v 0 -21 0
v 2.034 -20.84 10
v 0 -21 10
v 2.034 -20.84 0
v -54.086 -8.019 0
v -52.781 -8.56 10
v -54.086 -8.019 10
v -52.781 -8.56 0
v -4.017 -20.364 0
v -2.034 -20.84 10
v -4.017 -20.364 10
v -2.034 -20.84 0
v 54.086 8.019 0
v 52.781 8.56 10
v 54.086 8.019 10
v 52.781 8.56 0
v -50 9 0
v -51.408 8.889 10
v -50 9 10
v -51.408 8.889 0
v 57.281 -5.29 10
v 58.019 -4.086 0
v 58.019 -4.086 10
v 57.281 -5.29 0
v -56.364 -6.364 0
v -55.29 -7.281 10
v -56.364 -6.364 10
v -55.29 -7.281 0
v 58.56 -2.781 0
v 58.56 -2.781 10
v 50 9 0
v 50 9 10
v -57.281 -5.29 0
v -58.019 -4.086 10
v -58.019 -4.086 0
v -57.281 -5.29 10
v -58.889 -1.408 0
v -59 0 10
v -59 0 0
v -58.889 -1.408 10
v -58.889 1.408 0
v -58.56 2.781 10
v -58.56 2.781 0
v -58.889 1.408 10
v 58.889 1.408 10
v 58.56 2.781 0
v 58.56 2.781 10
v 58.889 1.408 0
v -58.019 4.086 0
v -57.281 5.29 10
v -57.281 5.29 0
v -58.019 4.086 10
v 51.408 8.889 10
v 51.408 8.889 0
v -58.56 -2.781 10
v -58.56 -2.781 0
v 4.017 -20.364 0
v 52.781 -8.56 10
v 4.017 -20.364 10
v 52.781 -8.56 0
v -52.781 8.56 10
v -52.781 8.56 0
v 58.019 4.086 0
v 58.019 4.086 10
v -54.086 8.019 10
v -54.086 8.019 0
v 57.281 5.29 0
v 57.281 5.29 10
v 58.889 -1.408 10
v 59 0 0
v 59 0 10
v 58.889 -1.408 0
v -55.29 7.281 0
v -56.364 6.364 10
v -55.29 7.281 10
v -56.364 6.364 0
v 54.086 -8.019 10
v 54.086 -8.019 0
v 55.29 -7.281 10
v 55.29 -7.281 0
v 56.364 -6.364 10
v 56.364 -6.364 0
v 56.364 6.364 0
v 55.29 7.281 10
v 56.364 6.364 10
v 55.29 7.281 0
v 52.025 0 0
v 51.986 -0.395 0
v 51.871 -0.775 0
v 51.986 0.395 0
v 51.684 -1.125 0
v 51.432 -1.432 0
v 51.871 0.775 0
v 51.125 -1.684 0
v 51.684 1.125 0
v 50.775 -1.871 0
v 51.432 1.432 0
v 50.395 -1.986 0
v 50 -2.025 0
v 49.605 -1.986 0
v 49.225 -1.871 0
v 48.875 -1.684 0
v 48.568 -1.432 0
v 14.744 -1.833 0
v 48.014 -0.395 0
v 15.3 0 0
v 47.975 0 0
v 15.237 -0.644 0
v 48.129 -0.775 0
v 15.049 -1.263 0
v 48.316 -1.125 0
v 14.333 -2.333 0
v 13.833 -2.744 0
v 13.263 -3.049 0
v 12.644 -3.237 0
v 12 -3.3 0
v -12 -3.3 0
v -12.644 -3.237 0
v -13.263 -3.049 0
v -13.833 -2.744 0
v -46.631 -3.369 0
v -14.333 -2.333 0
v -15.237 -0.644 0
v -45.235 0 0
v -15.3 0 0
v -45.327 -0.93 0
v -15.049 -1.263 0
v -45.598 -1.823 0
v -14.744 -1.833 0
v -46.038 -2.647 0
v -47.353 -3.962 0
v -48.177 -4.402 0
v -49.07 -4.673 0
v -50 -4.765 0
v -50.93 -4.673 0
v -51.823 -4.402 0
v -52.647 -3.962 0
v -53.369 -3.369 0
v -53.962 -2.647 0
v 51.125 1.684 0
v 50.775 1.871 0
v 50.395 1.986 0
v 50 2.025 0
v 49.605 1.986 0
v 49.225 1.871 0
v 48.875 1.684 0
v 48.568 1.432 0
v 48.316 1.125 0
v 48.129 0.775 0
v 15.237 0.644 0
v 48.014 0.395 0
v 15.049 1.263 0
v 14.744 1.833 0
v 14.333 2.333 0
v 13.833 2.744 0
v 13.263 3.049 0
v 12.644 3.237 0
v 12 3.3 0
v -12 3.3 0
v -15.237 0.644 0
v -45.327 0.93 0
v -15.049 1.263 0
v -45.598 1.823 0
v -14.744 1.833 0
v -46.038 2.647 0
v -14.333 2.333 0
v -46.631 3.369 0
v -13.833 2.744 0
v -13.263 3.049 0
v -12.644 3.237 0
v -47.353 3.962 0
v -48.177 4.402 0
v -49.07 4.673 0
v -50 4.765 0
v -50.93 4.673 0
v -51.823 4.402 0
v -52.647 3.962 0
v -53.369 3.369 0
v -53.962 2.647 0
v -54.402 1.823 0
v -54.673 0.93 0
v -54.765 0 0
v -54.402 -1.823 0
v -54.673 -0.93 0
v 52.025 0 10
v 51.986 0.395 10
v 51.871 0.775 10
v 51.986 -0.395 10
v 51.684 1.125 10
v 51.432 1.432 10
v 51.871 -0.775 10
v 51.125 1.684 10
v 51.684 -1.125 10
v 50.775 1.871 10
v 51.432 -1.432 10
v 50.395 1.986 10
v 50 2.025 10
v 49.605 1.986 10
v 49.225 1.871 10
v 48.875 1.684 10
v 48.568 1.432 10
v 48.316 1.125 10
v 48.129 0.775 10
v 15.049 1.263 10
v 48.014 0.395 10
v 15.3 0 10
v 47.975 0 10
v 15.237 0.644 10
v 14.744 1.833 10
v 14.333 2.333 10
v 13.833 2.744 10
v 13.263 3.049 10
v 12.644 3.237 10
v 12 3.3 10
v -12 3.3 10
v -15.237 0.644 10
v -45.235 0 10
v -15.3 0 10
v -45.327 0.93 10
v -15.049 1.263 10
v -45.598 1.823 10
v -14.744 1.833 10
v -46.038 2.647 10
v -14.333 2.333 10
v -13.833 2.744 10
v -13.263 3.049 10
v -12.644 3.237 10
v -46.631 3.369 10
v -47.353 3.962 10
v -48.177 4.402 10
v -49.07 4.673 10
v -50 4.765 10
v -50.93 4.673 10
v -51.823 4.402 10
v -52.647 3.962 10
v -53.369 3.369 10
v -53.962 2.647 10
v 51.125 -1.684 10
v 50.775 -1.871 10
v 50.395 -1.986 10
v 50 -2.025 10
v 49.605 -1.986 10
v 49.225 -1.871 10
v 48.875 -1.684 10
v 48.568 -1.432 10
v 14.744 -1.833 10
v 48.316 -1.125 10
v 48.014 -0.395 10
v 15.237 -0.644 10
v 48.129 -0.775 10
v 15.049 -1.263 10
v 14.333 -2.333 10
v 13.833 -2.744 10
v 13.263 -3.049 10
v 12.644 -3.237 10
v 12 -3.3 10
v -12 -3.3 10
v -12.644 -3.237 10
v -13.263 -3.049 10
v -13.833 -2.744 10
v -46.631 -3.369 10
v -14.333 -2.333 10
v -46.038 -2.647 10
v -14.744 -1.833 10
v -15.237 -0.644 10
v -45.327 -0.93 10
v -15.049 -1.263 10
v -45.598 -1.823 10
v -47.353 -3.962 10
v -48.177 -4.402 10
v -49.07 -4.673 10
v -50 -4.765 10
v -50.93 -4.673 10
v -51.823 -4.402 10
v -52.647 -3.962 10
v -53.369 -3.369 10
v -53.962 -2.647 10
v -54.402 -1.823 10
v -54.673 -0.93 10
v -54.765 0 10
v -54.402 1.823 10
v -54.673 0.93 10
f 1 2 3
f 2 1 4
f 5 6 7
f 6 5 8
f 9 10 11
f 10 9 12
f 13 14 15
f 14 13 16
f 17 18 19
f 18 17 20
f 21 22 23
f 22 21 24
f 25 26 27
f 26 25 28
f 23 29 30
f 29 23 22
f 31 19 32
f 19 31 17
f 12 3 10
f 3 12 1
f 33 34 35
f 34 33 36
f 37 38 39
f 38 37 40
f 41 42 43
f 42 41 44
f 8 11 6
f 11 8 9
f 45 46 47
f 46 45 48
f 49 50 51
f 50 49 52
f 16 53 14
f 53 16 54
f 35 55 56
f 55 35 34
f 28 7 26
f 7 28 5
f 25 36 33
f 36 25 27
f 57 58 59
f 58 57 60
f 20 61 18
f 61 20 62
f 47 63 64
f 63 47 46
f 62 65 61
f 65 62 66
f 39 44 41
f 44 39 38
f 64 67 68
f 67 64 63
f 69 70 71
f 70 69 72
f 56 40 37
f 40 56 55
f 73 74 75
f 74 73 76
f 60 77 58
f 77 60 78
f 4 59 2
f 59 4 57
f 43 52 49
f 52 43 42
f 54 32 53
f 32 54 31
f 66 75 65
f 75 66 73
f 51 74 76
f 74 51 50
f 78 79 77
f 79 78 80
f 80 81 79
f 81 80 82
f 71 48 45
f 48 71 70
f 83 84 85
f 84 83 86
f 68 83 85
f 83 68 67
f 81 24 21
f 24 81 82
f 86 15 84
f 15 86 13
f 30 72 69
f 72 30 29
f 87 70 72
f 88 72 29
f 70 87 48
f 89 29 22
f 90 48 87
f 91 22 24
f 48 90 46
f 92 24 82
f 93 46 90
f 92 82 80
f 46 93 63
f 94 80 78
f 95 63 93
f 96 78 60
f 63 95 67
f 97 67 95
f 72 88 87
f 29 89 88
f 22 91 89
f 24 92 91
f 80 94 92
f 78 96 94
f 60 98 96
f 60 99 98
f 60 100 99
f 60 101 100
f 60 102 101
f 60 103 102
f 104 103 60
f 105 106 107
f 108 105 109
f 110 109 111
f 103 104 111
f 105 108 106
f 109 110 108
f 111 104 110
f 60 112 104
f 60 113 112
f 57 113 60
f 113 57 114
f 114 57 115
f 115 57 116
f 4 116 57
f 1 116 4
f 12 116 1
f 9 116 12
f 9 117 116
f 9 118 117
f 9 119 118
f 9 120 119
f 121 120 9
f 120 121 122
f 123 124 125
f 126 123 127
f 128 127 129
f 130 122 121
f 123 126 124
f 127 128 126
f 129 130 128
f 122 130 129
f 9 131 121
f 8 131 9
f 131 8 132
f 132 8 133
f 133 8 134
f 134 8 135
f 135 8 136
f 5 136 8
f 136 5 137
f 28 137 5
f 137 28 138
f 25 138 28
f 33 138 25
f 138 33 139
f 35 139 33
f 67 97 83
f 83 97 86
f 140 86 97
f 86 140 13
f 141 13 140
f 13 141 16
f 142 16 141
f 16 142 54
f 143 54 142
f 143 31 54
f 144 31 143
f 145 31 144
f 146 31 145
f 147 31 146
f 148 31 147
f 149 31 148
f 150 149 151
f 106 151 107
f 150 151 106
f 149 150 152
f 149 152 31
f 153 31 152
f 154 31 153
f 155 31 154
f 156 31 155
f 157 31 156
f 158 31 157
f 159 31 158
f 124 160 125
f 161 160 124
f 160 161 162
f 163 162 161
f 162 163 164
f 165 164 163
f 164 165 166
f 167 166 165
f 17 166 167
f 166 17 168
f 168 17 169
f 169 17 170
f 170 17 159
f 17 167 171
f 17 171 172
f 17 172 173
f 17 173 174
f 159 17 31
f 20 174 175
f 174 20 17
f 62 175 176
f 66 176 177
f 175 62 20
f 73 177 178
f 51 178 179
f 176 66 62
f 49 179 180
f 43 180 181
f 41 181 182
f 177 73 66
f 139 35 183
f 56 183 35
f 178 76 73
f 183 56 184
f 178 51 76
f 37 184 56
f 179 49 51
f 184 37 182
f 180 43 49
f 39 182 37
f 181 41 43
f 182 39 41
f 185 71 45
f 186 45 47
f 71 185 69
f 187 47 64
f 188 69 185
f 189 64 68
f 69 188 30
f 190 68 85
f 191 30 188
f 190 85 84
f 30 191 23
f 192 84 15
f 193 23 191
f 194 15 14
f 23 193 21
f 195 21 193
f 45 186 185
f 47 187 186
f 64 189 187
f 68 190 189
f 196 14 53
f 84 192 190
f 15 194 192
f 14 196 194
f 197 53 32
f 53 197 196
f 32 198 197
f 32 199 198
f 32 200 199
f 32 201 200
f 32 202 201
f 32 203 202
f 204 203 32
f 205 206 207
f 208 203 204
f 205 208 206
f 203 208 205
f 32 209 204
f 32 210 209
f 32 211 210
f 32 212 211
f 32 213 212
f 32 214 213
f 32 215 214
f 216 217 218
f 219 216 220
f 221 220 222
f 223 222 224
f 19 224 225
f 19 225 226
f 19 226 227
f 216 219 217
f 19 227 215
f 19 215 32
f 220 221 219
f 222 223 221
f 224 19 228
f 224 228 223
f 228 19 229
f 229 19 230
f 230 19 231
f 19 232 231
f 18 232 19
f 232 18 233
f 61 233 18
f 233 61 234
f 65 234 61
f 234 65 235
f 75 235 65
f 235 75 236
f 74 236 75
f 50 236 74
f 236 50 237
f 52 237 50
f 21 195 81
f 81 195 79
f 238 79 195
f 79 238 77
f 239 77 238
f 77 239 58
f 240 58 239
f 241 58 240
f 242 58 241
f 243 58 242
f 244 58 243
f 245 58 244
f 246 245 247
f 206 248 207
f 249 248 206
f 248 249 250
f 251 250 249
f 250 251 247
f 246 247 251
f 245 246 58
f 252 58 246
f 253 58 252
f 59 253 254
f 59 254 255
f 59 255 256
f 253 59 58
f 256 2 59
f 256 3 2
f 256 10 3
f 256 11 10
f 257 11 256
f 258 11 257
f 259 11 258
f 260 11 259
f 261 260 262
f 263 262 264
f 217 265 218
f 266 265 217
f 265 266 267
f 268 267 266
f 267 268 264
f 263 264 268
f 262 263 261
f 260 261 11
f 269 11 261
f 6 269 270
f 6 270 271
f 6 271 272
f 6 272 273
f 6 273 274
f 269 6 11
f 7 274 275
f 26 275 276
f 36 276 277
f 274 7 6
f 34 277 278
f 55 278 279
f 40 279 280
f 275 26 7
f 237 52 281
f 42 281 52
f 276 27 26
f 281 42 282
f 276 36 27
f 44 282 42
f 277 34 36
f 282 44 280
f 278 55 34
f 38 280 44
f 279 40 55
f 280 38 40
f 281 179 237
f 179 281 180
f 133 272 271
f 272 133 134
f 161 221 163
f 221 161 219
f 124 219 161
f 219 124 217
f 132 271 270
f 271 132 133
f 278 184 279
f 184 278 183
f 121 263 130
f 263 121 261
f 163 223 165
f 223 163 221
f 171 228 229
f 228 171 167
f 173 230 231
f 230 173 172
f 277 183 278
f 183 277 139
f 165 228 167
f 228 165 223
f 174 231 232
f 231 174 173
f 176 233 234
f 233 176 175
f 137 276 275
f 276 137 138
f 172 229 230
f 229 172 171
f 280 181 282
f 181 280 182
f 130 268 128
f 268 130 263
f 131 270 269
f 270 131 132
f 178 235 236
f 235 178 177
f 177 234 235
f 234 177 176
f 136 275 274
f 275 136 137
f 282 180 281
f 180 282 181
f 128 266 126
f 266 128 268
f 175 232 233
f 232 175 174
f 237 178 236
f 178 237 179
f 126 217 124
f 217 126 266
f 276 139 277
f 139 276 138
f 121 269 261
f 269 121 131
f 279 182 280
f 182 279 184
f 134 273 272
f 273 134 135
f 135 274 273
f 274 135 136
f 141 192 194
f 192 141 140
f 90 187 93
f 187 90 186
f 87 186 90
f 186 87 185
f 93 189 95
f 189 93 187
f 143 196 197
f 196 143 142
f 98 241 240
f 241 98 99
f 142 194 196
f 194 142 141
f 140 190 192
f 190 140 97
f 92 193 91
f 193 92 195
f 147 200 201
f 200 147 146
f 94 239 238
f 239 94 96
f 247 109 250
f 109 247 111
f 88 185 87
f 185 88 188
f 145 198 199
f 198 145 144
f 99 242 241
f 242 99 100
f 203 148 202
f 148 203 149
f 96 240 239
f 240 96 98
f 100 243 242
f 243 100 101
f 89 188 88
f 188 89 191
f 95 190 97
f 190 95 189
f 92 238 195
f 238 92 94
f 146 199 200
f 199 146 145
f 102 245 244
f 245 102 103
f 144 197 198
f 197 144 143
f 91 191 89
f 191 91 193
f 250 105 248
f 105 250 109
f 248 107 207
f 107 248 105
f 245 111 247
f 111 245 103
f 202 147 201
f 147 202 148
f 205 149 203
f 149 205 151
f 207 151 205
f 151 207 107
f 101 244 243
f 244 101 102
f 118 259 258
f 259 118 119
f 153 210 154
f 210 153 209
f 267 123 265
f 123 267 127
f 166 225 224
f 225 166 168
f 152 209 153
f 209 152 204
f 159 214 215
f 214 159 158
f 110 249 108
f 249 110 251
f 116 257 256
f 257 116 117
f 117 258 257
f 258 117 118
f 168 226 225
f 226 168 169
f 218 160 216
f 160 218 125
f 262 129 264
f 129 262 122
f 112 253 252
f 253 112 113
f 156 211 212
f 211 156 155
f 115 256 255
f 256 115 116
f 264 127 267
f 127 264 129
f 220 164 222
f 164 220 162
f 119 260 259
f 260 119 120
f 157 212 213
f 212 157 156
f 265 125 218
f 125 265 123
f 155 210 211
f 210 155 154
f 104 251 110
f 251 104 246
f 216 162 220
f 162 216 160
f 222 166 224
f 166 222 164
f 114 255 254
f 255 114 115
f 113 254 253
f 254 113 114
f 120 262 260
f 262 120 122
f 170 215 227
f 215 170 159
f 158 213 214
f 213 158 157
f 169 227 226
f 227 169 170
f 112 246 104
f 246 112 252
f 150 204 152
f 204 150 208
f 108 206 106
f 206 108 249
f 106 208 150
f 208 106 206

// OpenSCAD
$fn = 32;

// ----------------------------------------------------------------------
// Lever: 100 mm between the bosses, 10 mm thick, smooth outline
// ----------------------------------------------------------------------

// --- parameters (mm) ---
lever_l = 100;            // distance between the boss centres
boss_a = 18;              // first boss diameter
boss_b = 18;              // second boss diameter
bore_a = 9.53;            // first bore
bore_b = 4.05;            // second bore
lever_t = 10;             // lever thickness
boss_c = 26;              // middle boss diameter
bend = 8;                 // how far the middle boss drops
slot_w = 6.6;             // adjustment slot width

lever_profile = [[-59, 0], [-58.889, -1.408], [-58.56, -2.781], [-58.019, -4.086], [-57.281, -5.29], [-56.364, -6.364], [-55.29, -7.281], [-54.086, -8.019], [-52.781, -8.56], [-4.017, -20.364], [-2.034, -20.84], [0, -21], [2.034, -20.84], [4.017, -20.364], [52.781, -8.56], [54.086, -8.019], [55.29, -7.281], [56.364, -6.364], [57.281, -5.29], [58.019, -4.086], [58.56, -2.781], [58.889, -1.408], [59, 0], [58.889, 1.408], [58.56, 2.781], [58.019, 4.086], [57.281, 5.29], [56.364, 6.364], [55.29, 7.281], [54.086, 8.019], [52.781, 8.56], [51.408, 8.889], [50, 9], [-50, 9], [-51.408, 8.889], [-52.781, 8.56], [-54.086, 8.019], [-55.29, 7.281], [-56.364, 6.364], [-57.281, 5.29], [-58.019, 4.086], [-58.56, 2.781], [-58.889, 1.408]];

difference() {
  linear_extrude(height = lever_t) polygon(lever_profile);
  translate([-50, 0, -2.5]) cylinder(h = lever_t + 5, d = bore_a);
  translate([50, 0, -2.5]) cylinder(h = lever_t + 5, d = bore_b);
  /* slotted adjustment, stadium shaped */
  hull() {
    translate([-12, 0, -2.5]) cylinder(h = lever_t + 5, d = slot_w);
    translate([12, 0, -2.5]) cylinder(h = lever_t + 5, d = slot_w);
  }
}
